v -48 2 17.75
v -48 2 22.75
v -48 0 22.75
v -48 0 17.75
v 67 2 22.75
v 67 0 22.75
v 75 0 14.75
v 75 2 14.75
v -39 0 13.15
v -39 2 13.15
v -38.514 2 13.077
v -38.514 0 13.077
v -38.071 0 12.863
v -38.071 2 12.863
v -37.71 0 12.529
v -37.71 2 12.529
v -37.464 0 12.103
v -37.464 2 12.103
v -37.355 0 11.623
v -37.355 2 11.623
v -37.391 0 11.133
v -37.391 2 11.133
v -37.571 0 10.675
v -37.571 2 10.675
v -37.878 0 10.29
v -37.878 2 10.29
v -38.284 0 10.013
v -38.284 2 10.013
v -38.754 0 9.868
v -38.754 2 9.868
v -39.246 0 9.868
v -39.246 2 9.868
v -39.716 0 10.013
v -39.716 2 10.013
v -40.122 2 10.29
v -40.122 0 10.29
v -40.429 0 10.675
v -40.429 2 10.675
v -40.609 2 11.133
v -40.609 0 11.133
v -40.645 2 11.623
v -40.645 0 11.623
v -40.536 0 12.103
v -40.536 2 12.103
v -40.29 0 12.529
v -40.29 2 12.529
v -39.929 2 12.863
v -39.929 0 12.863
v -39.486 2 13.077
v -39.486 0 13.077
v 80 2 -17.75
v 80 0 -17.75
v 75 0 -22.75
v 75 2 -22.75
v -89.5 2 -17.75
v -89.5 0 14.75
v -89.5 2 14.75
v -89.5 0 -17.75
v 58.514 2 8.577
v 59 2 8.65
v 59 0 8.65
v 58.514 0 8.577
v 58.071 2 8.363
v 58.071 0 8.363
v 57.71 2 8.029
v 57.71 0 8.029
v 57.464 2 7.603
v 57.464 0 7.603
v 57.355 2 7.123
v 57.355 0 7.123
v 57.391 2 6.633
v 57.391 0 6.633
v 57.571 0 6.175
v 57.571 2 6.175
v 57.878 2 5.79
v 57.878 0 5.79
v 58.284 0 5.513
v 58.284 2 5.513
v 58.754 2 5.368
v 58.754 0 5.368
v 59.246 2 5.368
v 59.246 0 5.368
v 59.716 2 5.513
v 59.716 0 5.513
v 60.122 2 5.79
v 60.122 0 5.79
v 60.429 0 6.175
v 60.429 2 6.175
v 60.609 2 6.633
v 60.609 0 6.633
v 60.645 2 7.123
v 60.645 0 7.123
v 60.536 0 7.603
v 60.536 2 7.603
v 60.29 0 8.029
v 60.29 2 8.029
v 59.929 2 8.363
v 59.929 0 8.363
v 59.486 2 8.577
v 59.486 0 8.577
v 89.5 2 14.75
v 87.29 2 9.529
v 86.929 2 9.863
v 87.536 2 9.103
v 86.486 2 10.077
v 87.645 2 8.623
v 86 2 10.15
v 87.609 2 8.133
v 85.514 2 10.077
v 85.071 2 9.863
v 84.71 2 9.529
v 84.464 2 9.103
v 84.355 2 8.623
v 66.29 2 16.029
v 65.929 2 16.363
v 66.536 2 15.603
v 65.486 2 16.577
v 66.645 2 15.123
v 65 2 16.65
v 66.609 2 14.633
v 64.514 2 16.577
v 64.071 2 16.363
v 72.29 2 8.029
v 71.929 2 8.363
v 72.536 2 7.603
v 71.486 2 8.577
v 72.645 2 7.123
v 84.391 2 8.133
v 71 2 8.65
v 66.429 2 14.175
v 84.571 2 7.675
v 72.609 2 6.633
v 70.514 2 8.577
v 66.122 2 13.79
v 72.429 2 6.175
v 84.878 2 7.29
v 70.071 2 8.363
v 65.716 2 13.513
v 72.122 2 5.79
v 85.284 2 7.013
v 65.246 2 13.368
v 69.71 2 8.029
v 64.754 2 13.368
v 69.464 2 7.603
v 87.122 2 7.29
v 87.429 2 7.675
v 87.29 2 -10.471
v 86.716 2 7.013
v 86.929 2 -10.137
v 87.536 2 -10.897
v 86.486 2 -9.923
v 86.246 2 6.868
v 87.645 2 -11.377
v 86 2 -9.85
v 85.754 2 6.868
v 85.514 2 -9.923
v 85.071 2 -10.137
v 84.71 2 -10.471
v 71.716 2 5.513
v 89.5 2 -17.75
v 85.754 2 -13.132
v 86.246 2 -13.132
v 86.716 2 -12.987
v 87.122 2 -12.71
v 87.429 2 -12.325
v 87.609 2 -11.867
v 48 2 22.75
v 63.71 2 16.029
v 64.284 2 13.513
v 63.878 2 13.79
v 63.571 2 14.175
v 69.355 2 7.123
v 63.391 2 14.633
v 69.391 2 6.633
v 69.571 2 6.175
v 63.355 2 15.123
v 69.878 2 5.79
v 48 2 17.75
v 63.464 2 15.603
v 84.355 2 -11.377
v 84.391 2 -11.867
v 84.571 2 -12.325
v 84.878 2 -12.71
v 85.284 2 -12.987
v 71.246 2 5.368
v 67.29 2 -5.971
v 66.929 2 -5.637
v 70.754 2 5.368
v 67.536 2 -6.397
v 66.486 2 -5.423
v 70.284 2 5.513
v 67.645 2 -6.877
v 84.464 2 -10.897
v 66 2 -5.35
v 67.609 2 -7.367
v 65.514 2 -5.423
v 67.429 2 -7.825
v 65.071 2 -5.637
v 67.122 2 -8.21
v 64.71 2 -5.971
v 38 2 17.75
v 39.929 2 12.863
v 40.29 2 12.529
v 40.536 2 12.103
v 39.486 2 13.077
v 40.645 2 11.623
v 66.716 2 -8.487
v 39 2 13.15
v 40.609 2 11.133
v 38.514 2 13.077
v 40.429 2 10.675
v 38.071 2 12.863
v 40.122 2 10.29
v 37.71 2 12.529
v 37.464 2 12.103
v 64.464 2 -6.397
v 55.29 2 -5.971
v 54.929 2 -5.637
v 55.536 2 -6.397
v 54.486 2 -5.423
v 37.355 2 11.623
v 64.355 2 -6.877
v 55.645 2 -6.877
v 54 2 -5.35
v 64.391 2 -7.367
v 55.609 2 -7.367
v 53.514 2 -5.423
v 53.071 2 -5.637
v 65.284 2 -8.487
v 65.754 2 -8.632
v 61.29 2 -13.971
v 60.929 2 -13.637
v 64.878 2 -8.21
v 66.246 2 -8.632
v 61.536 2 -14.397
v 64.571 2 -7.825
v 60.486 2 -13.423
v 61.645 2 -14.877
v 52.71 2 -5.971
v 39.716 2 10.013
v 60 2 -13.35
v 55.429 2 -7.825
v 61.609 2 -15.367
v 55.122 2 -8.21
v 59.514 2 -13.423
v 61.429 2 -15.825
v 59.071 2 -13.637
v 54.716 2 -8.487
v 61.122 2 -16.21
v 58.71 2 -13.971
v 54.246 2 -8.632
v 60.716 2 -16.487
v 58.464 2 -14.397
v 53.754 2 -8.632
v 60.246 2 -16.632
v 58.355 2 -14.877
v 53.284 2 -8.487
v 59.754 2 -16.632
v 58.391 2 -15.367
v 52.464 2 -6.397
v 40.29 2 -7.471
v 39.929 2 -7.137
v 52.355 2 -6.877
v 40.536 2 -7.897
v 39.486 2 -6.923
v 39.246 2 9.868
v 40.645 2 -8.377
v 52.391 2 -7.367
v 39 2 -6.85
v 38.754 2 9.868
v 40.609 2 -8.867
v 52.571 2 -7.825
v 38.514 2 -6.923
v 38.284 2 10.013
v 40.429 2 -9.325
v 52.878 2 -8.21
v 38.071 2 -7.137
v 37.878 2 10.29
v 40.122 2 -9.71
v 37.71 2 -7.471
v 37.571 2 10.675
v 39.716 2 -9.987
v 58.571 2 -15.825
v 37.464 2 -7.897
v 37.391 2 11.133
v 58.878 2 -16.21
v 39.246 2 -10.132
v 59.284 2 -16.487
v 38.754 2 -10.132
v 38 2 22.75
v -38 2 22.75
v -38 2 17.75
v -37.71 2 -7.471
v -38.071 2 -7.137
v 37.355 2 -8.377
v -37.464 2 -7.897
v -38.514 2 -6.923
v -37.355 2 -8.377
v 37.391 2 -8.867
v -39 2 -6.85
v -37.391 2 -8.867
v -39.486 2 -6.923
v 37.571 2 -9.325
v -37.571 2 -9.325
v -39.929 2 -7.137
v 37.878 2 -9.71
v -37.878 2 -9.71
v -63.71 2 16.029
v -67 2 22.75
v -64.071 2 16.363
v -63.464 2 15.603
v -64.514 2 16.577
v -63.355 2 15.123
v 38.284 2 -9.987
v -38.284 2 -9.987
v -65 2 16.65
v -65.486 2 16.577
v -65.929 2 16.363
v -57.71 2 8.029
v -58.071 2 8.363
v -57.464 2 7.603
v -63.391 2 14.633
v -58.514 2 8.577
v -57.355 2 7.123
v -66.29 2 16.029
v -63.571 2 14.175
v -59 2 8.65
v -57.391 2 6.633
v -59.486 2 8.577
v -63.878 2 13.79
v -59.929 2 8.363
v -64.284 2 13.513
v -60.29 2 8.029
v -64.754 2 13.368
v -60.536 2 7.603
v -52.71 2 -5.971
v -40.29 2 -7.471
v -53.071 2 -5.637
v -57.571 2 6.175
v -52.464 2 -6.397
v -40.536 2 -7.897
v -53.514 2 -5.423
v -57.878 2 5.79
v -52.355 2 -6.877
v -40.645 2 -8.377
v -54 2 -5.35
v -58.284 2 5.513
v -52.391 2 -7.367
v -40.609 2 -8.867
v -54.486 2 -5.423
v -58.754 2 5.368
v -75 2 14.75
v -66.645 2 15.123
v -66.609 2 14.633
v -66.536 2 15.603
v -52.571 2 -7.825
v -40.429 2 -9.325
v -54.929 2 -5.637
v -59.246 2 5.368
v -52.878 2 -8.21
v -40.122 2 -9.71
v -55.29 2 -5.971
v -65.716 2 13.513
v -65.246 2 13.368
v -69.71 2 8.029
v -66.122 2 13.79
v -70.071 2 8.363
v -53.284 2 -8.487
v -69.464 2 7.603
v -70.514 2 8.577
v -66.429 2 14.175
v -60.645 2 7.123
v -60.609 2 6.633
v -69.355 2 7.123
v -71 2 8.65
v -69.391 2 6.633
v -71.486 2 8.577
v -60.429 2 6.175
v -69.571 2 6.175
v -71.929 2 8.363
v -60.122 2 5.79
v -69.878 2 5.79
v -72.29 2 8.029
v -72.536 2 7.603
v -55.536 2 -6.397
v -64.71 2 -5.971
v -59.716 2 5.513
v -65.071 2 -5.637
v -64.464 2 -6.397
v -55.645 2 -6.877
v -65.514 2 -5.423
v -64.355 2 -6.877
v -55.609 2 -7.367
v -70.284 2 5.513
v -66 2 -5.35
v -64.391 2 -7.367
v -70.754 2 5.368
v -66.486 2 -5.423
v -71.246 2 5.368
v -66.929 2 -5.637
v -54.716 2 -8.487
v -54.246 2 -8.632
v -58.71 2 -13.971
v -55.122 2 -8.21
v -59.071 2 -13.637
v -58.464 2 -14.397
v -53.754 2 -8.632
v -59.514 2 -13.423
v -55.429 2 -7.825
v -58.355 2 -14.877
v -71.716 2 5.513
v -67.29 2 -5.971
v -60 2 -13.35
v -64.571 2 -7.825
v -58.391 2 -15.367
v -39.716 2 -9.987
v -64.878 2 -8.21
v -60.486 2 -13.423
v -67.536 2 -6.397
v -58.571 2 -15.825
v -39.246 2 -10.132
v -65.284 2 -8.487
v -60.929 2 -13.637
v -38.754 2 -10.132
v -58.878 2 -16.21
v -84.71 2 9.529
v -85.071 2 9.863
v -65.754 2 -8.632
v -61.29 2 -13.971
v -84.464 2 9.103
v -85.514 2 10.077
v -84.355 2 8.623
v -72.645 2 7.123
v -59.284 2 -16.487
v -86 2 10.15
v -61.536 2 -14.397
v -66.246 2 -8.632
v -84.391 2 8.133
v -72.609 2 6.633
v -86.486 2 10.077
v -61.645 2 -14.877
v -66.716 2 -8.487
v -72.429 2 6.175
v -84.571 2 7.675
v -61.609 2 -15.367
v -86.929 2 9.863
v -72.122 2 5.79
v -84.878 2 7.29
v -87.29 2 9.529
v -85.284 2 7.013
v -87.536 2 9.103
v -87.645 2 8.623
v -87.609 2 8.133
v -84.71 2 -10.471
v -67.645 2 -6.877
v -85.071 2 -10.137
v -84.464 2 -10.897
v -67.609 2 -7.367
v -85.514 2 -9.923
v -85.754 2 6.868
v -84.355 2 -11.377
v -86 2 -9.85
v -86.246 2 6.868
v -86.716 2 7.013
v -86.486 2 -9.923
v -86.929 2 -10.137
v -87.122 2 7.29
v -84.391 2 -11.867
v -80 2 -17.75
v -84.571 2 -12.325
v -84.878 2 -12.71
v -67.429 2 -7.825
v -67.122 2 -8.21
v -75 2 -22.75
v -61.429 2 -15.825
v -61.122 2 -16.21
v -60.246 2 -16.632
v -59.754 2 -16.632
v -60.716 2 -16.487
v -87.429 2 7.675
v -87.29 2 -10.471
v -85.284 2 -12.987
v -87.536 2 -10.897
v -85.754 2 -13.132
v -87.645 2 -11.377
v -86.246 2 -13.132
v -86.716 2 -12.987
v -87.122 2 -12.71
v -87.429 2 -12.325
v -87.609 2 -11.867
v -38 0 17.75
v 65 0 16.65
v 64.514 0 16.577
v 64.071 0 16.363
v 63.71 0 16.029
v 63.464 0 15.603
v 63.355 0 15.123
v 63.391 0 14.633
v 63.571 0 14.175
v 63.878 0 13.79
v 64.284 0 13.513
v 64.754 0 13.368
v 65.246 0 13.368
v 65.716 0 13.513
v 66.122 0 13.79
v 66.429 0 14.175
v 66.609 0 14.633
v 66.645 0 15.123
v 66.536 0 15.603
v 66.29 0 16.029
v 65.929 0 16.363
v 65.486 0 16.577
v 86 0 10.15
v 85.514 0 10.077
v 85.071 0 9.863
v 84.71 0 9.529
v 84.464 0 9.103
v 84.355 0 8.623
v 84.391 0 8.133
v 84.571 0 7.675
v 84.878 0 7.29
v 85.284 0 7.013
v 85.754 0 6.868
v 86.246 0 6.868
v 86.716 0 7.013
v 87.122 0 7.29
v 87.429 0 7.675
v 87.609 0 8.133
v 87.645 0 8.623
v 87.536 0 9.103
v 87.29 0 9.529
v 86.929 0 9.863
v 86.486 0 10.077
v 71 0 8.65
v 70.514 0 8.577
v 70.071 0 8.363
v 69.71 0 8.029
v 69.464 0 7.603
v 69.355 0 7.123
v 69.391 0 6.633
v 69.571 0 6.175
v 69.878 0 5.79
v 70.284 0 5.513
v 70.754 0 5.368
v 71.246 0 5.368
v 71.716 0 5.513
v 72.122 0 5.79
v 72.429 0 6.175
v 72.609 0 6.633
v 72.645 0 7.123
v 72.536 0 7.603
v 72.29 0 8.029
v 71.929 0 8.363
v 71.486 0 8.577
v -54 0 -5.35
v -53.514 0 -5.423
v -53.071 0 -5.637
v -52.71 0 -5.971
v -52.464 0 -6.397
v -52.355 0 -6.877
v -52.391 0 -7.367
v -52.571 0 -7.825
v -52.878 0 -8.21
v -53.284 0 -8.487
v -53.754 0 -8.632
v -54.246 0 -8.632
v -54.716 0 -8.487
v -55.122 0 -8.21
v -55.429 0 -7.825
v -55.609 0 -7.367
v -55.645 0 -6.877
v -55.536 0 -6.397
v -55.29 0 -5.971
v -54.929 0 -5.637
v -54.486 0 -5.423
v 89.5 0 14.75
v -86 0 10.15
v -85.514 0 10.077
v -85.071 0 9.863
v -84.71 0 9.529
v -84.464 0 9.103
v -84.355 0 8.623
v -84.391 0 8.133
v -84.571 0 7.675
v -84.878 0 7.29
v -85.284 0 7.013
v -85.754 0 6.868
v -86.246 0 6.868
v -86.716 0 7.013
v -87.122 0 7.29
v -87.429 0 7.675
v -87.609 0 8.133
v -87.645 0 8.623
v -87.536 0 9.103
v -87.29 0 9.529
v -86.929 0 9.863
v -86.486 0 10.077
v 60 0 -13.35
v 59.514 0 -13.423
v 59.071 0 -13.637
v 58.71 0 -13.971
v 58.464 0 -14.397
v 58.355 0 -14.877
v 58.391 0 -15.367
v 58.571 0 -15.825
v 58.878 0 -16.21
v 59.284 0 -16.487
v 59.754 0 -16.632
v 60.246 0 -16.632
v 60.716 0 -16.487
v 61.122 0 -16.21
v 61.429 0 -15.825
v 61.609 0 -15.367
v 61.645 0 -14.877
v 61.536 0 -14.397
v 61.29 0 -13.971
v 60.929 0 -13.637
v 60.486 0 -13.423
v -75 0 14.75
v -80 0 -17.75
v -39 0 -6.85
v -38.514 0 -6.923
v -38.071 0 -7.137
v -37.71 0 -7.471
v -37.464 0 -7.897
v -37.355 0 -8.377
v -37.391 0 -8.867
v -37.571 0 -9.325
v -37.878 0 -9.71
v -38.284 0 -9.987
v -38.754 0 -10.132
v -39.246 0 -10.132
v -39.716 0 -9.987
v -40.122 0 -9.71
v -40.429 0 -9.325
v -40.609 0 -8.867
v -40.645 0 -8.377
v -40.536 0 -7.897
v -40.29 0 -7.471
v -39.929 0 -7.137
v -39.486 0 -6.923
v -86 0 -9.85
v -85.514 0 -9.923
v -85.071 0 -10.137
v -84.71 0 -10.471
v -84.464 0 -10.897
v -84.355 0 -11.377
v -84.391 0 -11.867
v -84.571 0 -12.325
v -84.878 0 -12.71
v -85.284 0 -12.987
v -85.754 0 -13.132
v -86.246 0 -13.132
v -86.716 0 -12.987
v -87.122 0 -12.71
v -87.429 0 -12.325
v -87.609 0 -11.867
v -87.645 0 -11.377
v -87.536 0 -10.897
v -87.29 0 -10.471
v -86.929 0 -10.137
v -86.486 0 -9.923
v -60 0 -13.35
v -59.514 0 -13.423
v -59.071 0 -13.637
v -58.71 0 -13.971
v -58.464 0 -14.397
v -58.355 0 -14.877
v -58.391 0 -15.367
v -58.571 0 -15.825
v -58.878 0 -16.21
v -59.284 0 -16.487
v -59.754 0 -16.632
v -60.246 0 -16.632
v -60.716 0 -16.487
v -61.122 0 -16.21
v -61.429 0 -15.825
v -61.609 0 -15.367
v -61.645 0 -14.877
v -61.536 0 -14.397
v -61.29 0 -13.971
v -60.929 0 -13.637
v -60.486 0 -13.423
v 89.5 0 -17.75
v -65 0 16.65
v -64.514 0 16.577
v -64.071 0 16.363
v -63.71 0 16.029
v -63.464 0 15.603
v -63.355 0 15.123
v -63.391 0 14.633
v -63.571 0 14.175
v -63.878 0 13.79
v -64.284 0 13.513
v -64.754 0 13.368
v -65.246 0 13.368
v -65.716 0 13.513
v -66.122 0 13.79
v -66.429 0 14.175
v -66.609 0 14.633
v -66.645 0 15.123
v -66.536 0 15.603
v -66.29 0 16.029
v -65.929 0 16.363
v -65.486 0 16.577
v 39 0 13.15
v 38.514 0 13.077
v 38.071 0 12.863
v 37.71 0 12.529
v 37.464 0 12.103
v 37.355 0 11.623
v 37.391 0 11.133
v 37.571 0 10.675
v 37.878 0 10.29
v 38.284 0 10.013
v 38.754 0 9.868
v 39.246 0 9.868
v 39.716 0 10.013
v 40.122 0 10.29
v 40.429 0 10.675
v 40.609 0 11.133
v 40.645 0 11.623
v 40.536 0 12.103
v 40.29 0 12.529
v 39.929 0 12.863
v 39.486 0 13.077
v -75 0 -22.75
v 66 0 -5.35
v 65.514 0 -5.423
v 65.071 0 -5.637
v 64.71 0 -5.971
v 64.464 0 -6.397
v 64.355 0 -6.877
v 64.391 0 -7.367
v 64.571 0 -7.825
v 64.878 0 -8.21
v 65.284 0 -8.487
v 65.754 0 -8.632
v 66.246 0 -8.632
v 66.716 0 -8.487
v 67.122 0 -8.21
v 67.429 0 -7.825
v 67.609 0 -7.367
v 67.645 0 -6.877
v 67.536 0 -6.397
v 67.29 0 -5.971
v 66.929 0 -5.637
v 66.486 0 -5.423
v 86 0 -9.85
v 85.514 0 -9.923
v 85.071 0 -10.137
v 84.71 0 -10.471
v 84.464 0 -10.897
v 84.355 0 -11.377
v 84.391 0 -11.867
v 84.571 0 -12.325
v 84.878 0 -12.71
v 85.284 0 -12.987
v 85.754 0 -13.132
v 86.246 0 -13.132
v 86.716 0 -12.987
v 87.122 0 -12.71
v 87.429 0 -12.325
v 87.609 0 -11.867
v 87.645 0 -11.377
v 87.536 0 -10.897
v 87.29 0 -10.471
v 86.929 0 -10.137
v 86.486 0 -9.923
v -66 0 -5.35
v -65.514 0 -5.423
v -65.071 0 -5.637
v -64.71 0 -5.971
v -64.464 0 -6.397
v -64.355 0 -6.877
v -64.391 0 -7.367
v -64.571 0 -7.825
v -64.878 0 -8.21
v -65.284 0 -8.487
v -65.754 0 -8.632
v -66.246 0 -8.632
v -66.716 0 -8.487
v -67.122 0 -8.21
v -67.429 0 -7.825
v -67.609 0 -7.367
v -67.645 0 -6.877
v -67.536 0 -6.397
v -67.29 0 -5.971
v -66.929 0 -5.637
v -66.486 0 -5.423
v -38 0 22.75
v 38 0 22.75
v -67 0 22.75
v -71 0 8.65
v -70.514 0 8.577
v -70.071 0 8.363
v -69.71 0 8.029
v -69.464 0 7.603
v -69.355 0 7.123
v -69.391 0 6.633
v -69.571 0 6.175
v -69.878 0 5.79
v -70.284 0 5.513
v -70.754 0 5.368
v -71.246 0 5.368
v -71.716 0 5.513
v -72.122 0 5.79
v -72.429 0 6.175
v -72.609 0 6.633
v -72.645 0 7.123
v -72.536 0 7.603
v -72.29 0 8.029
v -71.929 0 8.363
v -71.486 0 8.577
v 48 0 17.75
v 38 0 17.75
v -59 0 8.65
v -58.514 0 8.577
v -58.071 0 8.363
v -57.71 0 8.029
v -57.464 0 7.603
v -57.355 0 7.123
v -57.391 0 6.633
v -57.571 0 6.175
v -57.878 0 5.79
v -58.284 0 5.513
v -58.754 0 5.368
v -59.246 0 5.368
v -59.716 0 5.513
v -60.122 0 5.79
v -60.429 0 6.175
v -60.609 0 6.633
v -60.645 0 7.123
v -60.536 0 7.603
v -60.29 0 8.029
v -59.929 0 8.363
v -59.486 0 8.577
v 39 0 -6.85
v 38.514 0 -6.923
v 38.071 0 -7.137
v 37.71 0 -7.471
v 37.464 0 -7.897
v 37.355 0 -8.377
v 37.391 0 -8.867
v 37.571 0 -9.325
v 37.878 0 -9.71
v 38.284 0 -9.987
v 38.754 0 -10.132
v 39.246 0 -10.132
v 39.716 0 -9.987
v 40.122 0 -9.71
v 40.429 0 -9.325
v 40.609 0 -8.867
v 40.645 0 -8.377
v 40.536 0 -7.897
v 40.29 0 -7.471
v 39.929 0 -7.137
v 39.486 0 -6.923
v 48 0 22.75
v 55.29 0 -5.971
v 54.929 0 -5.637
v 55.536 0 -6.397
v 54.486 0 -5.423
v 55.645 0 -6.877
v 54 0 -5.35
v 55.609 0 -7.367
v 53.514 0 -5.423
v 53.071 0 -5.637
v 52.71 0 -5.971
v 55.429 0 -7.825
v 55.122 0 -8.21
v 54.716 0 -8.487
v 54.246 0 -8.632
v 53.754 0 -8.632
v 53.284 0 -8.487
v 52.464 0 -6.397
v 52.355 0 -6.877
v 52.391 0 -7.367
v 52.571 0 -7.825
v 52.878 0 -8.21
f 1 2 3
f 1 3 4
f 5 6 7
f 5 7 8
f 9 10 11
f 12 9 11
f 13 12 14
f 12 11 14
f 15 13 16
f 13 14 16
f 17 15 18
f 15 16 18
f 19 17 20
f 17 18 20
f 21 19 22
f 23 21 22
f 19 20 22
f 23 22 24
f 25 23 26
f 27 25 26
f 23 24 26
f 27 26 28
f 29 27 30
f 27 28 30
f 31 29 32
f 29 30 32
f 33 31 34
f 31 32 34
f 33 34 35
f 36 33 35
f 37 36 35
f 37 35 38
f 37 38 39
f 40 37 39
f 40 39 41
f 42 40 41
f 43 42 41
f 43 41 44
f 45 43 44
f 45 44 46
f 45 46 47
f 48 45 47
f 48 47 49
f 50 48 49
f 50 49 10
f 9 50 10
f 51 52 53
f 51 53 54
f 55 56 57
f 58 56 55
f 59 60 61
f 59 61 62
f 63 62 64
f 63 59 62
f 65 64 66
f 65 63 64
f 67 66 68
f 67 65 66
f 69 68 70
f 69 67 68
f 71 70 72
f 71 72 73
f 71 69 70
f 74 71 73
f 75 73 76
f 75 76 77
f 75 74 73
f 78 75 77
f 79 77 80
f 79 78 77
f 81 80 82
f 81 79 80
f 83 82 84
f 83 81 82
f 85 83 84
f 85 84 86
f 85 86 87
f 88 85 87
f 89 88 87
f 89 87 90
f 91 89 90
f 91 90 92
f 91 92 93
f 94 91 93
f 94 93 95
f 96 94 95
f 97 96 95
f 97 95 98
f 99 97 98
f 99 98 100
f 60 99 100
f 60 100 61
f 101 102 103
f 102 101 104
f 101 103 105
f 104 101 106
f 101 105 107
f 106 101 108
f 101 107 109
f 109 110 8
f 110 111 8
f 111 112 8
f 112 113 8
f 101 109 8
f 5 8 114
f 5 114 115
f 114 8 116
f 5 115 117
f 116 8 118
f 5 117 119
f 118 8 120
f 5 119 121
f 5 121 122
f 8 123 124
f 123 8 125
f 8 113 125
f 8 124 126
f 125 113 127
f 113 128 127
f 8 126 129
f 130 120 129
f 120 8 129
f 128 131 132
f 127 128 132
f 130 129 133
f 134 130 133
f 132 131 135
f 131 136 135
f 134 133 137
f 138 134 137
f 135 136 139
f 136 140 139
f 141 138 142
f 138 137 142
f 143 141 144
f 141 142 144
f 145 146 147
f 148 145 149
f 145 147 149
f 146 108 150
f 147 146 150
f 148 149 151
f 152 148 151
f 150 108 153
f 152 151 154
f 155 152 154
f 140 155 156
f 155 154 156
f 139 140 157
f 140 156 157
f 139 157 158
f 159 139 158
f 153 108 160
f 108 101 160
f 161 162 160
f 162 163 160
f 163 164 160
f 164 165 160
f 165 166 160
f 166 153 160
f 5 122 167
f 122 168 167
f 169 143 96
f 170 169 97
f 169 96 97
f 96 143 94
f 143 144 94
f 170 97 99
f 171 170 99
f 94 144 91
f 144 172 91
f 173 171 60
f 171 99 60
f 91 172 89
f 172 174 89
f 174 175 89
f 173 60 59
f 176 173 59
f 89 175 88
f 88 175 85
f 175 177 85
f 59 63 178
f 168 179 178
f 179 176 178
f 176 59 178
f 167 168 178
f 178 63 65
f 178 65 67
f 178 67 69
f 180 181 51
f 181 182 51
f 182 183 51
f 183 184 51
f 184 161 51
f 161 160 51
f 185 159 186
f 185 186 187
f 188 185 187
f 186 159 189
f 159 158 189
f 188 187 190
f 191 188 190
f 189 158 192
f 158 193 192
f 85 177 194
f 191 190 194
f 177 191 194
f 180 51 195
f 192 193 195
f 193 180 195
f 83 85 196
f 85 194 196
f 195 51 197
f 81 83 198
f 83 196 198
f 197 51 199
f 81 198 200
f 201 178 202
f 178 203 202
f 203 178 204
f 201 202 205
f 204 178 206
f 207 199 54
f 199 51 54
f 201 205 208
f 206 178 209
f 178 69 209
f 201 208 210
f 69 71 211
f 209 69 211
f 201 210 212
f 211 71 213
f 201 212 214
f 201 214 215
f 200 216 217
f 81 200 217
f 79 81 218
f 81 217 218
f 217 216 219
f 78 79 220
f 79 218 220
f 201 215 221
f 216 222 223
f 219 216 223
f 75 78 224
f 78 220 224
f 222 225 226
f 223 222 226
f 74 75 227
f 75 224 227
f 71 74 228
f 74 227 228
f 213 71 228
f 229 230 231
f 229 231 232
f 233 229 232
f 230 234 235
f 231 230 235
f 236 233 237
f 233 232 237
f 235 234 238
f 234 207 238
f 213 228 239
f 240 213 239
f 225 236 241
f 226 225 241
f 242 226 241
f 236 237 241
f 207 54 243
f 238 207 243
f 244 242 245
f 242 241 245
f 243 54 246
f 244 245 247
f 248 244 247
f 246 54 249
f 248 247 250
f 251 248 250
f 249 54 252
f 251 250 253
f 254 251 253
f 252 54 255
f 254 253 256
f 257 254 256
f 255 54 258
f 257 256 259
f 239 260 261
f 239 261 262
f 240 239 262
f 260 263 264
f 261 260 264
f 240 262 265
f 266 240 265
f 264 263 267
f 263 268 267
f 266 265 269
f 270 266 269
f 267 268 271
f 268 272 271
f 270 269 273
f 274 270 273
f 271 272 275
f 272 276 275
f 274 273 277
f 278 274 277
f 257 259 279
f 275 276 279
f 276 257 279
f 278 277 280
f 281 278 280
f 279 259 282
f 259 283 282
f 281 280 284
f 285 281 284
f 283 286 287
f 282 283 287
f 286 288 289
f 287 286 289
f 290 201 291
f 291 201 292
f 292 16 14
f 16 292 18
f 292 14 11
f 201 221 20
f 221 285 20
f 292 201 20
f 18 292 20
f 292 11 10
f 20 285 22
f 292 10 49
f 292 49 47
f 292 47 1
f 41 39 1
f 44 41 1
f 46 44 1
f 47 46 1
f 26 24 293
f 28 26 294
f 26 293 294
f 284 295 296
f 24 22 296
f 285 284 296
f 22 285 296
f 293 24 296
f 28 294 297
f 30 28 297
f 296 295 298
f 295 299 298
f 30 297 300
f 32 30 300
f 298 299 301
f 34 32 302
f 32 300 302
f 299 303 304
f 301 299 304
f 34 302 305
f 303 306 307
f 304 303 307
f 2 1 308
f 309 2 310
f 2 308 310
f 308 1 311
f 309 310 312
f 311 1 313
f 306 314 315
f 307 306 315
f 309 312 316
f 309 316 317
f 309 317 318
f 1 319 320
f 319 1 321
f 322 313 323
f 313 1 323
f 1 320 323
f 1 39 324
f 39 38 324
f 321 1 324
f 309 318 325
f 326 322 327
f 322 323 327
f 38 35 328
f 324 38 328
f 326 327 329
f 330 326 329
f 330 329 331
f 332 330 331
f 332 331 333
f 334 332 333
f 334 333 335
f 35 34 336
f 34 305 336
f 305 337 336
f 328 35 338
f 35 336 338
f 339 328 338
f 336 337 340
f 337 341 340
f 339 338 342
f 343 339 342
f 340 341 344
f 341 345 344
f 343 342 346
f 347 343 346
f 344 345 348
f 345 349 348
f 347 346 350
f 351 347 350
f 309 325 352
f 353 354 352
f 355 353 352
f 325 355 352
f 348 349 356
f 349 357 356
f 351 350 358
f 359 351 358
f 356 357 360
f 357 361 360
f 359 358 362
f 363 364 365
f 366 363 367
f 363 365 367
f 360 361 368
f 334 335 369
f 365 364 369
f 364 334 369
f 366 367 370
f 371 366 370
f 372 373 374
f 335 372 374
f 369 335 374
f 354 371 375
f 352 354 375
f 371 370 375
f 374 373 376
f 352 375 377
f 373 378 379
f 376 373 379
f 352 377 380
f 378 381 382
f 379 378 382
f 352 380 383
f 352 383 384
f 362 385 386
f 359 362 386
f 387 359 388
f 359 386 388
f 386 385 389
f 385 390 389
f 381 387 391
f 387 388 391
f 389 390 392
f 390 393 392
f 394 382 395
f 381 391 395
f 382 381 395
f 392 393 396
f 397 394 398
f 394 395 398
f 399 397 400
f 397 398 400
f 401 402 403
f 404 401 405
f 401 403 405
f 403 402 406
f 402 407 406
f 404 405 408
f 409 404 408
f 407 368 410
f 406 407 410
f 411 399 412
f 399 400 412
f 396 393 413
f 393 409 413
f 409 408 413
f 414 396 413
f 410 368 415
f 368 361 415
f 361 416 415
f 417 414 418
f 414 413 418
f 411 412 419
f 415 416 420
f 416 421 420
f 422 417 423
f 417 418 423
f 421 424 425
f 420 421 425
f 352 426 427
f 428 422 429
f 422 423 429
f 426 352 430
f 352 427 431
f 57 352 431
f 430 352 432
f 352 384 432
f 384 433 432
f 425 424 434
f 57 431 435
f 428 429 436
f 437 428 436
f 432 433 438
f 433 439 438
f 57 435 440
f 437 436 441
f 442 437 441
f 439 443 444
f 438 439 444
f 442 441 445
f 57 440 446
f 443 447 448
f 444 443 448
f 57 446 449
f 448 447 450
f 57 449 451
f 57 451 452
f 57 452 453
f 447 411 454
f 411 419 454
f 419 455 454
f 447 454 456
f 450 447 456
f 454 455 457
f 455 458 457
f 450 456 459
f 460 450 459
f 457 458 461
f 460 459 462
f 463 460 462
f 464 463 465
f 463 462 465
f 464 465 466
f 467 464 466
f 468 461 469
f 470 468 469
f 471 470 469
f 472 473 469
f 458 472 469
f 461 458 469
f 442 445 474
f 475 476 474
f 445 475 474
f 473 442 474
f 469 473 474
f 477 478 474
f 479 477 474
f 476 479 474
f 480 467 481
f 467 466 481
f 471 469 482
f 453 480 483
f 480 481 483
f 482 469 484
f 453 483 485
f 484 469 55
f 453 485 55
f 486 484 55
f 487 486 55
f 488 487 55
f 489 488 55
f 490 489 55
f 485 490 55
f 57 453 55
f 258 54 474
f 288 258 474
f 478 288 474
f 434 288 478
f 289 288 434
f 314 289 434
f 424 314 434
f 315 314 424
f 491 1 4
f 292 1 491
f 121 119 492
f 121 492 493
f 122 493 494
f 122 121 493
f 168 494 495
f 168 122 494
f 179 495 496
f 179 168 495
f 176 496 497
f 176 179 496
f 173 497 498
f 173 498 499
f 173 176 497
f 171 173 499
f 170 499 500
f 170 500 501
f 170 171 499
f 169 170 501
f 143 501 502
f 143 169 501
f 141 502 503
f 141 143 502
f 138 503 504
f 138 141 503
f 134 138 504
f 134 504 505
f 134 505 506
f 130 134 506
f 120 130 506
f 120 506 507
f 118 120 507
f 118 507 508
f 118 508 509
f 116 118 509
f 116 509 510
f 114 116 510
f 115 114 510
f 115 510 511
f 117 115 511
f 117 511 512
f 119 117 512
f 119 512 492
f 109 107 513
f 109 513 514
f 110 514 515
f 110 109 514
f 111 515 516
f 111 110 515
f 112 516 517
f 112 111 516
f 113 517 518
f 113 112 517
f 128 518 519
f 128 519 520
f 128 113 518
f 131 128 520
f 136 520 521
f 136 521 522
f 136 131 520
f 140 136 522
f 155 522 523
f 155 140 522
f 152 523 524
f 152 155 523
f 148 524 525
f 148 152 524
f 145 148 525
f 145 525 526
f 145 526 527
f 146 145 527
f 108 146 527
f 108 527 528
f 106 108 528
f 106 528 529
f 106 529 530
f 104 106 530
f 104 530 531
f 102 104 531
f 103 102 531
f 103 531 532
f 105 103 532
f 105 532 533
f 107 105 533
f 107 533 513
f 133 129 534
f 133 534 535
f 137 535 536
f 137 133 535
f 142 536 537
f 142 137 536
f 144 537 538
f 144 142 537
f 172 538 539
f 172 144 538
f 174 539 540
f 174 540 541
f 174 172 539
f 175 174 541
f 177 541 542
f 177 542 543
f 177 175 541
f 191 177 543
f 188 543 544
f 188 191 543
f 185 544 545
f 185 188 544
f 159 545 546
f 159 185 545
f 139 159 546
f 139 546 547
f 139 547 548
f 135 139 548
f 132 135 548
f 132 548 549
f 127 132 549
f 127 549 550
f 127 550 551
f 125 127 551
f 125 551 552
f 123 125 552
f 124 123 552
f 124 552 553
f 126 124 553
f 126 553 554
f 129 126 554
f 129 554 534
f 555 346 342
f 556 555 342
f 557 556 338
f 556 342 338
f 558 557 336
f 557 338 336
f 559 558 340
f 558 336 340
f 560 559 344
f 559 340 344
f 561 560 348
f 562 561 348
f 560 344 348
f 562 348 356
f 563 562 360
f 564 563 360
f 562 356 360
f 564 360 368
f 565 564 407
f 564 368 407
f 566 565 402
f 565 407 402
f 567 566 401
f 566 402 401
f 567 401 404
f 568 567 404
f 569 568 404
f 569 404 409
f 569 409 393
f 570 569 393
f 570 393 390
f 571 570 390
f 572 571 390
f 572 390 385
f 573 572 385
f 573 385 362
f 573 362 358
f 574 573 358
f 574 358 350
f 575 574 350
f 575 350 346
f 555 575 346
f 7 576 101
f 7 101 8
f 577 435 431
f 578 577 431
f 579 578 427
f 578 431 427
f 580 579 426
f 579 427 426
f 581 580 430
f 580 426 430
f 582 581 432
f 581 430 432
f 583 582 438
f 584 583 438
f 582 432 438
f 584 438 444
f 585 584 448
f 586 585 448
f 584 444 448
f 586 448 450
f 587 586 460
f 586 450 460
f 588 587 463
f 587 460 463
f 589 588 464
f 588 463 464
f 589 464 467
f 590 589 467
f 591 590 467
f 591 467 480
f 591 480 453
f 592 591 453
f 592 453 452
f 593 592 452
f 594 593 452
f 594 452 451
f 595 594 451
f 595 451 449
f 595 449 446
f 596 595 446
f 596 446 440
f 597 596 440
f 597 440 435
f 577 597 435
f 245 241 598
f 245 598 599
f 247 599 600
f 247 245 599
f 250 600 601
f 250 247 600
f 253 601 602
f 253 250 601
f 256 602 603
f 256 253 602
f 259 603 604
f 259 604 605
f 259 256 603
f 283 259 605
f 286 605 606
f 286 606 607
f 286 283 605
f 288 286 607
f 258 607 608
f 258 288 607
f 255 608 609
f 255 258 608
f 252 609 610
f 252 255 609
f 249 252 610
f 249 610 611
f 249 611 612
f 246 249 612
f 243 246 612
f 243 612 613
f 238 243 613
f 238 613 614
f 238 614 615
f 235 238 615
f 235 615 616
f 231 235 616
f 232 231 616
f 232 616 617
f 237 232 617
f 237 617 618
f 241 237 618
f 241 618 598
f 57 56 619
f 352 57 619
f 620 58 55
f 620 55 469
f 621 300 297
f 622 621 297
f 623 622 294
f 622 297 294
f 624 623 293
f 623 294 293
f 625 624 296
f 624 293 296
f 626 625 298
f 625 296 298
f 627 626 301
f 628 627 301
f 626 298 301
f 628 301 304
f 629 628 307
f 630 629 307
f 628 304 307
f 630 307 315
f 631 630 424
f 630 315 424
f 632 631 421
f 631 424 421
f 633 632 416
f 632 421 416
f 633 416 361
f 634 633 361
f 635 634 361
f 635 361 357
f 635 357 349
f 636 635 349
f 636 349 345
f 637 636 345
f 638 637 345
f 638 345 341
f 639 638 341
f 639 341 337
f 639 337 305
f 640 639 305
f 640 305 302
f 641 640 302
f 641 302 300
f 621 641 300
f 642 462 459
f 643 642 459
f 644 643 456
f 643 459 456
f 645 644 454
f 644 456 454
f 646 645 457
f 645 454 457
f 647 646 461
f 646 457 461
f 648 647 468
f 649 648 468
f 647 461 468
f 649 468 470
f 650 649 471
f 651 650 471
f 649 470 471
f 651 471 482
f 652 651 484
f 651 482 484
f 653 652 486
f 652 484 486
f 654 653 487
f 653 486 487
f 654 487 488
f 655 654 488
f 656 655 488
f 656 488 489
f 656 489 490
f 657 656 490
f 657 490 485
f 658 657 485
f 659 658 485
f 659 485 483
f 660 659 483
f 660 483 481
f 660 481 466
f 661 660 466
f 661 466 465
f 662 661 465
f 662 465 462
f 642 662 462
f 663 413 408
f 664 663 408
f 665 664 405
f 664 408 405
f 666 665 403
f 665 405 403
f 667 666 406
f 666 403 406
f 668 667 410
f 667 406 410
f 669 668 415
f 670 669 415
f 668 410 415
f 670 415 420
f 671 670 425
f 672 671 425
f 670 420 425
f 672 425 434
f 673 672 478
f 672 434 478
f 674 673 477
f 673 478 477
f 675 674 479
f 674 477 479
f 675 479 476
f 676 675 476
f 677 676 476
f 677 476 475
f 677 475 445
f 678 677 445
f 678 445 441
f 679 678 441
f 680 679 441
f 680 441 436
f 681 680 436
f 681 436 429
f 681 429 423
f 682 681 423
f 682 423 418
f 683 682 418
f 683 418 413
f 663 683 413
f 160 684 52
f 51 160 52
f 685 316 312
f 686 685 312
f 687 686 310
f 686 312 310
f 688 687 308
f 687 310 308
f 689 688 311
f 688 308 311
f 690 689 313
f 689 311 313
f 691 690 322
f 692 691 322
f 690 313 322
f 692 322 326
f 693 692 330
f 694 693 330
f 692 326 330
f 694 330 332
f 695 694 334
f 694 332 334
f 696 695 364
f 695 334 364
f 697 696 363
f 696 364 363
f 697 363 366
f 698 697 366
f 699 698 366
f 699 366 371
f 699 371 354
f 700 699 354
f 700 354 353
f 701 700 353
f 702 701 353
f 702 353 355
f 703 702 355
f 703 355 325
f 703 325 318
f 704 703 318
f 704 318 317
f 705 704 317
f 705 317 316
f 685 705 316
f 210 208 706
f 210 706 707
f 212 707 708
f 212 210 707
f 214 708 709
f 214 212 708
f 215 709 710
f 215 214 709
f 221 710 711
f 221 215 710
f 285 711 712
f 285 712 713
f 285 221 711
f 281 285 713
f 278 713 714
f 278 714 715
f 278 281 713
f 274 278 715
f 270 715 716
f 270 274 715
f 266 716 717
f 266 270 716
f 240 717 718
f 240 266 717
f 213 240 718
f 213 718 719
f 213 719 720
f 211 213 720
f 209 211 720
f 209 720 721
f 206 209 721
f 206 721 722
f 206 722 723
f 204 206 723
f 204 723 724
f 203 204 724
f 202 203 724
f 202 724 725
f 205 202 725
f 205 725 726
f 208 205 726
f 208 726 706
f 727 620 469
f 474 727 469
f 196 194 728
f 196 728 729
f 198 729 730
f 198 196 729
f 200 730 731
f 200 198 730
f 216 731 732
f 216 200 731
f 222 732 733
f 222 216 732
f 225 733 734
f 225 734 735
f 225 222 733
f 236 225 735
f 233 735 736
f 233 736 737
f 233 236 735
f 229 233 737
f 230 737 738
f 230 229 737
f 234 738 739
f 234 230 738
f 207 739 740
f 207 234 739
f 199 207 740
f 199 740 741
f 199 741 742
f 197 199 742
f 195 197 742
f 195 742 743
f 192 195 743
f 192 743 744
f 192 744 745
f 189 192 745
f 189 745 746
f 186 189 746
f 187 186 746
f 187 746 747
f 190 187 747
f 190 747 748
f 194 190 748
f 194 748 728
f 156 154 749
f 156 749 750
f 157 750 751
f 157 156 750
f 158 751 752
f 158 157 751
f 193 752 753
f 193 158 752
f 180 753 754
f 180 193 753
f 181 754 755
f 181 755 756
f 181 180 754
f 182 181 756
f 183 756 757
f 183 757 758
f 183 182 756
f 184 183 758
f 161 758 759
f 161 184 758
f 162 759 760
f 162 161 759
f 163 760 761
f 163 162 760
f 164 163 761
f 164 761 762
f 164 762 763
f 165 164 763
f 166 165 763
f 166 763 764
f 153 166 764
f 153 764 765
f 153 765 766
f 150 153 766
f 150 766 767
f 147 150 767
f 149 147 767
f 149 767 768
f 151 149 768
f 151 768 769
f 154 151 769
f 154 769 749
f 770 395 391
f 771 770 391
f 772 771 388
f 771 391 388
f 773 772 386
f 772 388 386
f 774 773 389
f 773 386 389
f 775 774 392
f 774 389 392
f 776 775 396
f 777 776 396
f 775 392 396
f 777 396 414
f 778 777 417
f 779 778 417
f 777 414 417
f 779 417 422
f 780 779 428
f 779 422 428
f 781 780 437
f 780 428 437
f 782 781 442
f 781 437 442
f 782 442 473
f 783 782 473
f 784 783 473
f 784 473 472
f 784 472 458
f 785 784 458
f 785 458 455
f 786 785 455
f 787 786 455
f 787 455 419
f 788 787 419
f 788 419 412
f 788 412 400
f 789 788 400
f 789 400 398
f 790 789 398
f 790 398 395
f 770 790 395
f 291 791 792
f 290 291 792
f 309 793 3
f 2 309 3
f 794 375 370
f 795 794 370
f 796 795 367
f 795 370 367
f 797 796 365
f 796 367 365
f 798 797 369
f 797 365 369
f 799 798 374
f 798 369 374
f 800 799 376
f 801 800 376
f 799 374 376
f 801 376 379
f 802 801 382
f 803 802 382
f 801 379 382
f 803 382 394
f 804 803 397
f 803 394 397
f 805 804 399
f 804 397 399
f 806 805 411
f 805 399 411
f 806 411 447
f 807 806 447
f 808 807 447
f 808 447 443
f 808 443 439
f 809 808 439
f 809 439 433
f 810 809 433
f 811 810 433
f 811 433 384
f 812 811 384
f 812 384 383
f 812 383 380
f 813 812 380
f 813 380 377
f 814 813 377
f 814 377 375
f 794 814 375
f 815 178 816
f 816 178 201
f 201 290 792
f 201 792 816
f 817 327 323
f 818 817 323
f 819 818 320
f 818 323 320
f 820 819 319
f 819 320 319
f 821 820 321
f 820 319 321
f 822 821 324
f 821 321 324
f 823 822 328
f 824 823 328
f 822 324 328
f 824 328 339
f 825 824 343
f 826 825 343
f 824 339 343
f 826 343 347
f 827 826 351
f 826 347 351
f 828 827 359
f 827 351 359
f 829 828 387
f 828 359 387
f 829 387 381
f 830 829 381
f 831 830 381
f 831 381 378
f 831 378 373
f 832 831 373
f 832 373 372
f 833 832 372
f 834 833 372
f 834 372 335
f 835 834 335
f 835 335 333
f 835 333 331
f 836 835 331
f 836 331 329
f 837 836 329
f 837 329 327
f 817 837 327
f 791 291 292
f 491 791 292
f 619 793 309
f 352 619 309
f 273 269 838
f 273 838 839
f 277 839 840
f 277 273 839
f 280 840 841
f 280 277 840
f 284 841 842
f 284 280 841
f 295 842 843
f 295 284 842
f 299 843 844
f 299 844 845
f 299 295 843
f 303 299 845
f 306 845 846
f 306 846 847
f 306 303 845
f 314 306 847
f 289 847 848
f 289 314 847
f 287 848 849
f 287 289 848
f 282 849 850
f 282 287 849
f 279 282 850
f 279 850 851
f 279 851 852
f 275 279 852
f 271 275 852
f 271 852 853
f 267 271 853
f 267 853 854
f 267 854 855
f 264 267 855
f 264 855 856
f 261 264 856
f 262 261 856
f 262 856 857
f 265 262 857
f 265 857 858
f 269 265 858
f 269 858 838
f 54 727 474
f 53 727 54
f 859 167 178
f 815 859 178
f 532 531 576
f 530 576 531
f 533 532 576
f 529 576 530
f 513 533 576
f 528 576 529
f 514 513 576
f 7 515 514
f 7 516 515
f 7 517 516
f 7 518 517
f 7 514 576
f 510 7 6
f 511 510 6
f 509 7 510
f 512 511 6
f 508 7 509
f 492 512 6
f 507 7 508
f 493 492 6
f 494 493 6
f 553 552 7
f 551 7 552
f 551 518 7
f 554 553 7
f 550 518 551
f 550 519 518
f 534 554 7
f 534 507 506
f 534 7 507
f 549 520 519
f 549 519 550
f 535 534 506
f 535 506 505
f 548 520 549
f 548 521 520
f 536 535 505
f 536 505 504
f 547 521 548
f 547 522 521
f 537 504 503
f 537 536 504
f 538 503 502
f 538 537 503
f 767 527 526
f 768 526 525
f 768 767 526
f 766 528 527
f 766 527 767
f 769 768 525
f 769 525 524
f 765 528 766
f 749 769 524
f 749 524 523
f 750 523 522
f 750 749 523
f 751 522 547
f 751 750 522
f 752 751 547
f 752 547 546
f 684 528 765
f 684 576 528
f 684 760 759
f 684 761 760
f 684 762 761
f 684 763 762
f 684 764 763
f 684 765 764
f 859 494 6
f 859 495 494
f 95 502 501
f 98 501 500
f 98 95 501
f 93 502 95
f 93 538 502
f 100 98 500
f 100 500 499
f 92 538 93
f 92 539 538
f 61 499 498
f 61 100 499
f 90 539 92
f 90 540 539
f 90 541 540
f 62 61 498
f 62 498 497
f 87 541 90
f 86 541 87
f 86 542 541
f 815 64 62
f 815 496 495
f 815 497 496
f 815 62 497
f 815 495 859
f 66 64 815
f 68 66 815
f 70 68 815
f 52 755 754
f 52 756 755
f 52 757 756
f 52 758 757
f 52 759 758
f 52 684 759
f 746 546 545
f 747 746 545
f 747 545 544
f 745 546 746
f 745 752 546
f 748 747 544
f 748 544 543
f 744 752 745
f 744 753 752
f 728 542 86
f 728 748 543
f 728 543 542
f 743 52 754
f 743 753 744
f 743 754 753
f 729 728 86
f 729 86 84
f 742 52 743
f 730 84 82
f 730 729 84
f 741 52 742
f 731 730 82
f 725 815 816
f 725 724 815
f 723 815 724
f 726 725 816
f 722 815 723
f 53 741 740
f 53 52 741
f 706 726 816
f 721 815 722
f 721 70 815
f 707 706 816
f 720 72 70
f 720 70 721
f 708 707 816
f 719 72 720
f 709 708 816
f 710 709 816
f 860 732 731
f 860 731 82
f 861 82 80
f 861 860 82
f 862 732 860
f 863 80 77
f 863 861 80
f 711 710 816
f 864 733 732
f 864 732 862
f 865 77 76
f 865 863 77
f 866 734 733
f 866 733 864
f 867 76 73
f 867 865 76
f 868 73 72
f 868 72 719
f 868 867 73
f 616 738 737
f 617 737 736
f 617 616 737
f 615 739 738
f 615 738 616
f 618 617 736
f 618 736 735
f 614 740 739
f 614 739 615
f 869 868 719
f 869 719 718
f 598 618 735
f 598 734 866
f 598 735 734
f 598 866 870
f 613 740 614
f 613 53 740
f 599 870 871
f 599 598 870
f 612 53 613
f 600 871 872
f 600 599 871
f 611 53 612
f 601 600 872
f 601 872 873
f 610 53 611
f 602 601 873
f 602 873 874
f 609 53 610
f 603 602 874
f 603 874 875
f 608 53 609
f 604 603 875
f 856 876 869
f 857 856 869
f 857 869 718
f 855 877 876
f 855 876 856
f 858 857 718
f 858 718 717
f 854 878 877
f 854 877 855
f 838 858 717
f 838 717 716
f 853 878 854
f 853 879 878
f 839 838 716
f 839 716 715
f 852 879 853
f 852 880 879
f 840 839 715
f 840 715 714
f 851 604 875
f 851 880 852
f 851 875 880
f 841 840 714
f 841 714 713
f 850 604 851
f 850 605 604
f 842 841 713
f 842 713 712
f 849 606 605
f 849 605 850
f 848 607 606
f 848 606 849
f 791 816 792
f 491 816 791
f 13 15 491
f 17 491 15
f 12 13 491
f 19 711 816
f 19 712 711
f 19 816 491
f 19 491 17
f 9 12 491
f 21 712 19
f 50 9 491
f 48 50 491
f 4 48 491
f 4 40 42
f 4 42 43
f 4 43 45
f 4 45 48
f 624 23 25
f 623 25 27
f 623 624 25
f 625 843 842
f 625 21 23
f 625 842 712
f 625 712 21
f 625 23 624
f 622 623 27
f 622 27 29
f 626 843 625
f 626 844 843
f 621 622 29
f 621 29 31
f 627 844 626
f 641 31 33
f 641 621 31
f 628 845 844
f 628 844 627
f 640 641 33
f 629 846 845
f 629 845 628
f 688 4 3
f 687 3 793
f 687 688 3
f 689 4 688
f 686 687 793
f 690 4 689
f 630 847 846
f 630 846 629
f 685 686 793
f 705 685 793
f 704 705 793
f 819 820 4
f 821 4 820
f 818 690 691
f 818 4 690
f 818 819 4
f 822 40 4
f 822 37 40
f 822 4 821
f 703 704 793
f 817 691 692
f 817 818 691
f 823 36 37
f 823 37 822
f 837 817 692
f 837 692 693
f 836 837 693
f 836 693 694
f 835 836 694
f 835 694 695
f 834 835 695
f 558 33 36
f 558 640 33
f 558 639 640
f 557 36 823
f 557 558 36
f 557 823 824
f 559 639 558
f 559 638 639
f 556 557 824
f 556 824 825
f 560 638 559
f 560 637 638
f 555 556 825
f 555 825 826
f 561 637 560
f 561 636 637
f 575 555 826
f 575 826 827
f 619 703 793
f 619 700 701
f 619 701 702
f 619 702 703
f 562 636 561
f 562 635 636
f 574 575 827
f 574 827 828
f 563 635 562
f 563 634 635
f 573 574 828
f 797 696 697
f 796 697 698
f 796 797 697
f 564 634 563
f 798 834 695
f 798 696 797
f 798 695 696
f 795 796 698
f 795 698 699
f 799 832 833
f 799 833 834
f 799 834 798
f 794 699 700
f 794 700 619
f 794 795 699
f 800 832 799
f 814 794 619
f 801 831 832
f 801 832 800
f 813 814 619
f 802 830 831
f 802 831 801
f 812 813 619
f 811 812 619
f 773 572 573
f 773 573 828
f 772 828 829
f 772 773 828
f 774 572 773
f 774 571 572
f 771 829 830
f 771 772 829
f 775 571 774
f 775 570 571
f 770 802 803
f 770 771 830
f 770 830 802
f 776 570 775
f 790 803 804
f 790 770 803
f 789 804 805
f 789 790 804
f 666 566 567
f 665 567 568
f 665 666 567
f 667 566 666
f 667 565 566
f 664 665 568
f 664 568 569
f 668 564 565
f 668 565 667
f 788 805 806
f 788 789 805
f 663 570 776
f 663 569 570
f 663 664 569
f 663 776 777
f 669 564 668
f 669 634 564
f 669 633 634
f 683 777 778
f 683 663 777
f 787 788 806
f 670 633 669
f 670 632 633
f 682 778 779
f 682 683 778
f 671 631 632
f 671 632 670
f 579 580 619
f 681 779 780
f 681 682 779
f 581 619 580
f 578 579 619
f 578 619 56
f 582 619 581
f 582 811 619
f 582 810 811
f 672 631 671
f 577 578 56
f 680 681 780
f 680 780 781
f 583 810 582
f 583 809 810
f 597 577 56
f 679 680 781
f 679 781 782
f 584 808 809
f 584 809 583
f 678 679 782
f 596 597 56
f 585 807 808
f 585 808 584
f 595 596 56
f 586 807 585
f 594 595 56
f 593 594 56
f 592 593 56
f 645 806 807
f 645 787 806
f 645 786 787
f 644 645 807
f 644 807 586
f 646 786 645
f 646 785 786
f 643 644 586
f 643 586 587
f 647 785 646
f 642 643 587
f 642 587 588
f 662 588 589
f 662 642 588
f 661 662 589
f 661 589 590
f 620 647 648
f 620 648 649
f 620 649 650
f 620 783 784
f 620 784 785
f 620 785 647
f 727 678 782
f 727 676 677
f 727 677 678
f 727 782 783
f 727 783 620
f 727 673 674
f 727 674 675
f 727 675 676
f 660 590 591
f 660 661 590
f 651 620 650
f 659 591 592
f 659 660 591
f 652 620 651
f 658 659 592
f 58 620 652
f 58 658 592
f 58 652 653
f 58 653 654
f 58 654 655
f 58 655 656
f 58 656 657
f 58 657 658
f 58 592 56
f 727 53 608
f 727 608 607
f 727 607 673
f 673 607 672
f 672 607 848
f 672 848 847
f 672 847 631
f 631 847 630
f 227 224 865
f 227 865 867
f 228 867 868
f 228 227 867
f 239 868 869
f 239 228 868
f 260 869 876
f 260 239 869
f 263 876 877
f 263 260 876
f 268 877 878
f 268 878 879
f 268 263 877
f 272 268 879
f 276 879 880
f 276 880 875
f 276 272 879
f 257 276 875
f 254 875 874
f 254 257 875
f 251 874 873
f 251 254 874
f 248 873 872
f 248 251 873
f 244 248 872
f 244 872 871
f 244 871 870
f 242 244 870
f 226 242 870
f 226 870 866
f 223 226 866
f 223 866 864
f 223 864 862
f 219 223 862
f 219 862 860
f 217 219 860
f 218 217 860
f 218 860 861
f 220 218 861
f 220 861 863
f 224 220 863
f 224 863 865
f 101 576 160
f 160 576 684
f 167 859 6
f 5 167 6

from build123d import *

# Parameters (mm, degrees)
SKETCH_1_W          = 150
SKETCH_1_H          = 45.5
EXTRUDE_1_DEPTH     = 2
CUT_EXTRUDE_1_REACH = 80.4
SKETCH_2_R          = 1.65
CUT_EXTRUDE_2_REACH = 80.4
SKETCH_4_W          = 10
SKETCH_4_H          = 5
CHAMFER_1_SIZE      = 8
SKETCH_6_W          = 14.5
SKETCH_6_H          = 32.5
EXTRUDE_2_DEPTH     = 2
CUT_EXTRUDE_3_REACH = 94.368
SKETCH_7_R          = 1.65
CHAMFER_2_SIZE      = 5


with BuildPart() as part:
    # 草图1 → 凸台-拉伸1 (new body)
    with BuildSketch(Plane(origin=(0, 0, 0), x_dir=(1, 0, 0), z_dir=(0, 1, 0))):
        Rectangle(SKETCH_1_W, SKETCH_1_H)
    extrude(amount=EXTRUDE_1_DEPTH)

    # 草图2 → 切除-拉伸1 (cut, up to next)
    with BuildSketch(Plane(origin=(0, 2, 0), x_dir=(1, 0, 0), z_dir=(0, 1, 0)), mode=Mode.PRIVATE) as cut_extrude_1_sk1:
        with Locations(Location((-60, 15, 0), (0, 0, 270))):
            Circle(SKETCH_2_R)
    cut_extrude_1_tool1 = extrude(cut_extrude_1_sk1.sketch, amount=-CUT_EXTRUDE_1_REACH, mode=Mode.PRIVATE) & part.part
    # 草图2 → 切除-拉伸1 (cut, up to next)
    with BuildSketch(Plane(origin=(0, 2, 0), x_dir=(1, 0, 0), z_dir=(0, 1, 0)), mode=Mode.PRIVATE) as cut_extrude_1_sk2:
        with Locations(Location((-66, 7, 0), (0, 0, 270))):
            Circle(SKETCH_2_R)
    cut_extrude_1_tool2 = extrude(cut_extrude_1_sk2.sketch, amount=-CUT_EXTRUDE_1_REACH, mode=Mode.PRIVATE) & part.part
    # 草图2 → 切除-拉伸1 (cut, up to next)
    with BuildSketch(Plane(origin=(0, 2, 0), x_dir=(1, 0, 0), z_dir=(0, 1, 0)), mode=Mode.PRIVATE) as cut_extrude_1_sk3:
        with Locations(Location((-54, 7, 0), (0, 0, 270))):
            Circle(SKETCH_2_R)
    cut_extrude_1_tool3 = extrude(cut_extrude_1_sk3.sketch, amount=-CUT_EXTRUDE_1_REACH, mode=Mode.PRIVATE) & part.part
    # 草图2 → 切除-拉伸1 (cut, up to next)
    with BuildSketch(Plane(origin=(0, 2, 0), x_dir=(1, 0, 0), z_dir=(0, 1, 0)), mode=Mode.PRIVATE) as cut_extrude_1_sk4:
        with Locations(Location((-71, -7, 0), (0, 0, 270))):
            Circle(SKETCH_2_R)
    cut_extrude_1_tool4 = extrude(cut_extrude_1_sk4.sketch, amount=-CUT_EXTRUDE_1_REACH, mode=Mode.PRIVATE) & part.part
    # 草图2 → 切除-拉伸1 (cut, up to next)
    with BuildSketch(Plane(origin=(0, 2, 0), x_dir=(1, 0, 0), z_dir=(0, 1, 0)), mode=Mode.PRIVATE) as cut_extrude_1_sk5:
        with Locations(Location((-59, -7, 0), (0, 0, 270))):
            Circle(SKETCH_2_R)
    cut_extrude_1_tool5 = extrude(cut_extrude_1_sk5.sketch, amount=-CUT_EXTRUDE_1_REACH, mode=Mode.PRIVATE) & part.part
    # 草图2 → 切除-拉伸1 (cut, up to next)
    with BuildSketch(Plane(origin=(0, 2, 0), x_dir=(1, 0, 0), z_dir=(0, 1, 0)), mode=Mode.PRIVATE) as cut_extrude_1_sk6:
        with Locations(Location((-65, -15, 0), (0, 0, 270))):
            Circle(SKETCH_2_R)
    cut_extrude_1_tool6 = extrude(cut_extrude_1_sk6.sketch, amount=-CUT_EXTRUDE_1_REACH, mode=Mode.PRIVATE) & part.part
    cut_extrude_1_1 = cut_extrude_1_tool1.solids().sort_by_distance((-60, 2, -15))[0]
    add(cut_extrude_1_1, mode=Mode.SUBTRACT)
    cut_extrude_1_2 = cut_extrude_1_tool2.solids().sort_by_distance((-66, 2, -7))[0]
    add(cut_extrude_1_2, mode=Mode.SUBTRACT)
    cut_extrude_1_3 = cut_extrude_1_tool3.solids().sort_by_distance((-54, 2, -7))[0]
    add(cut_extrude_1_3, mode=Mode.SUBTRACT)
    cut_extrude_1_4 = cut_extrude_1_tool4.solids().sort_by_distance((-71, 2, 7))[0]
    add(cut_extrude_1_4, mode=Mode.SUBTRACT)
    cut_extrude_1_5 = cut_extrude_1_tool5.solids().sort_by_distance((-59, 2, 7))[0]
    add(cut_extrude_1_5, mode=Mode.SUBTRACT)
    cut_extrude_1_6 = cut_extrude_1_tool6.solids().sort_by_distance((-65, 2, 15))[0]
    add(cut_extrude_1_6, mode=Mode.SUBTRACT)
    cut_extrude_1 = cut_extrude_1_1 + cut_extrude_1_2 + cut_extrude_1_3 + cut_extrude_1_4 + cut_extrude_1_5 + cut_extrude_1_6  # 切除-拉伸1 as one shape, for the pattern or mirror that repeats it

    # 草图4 → 切除-拉伸2 (cut, up to next)
    with BuildSketch(Plane(origin=(0, 2, 0), x_dir=(1, 0, 0), z_dir=(0, 1, 0)), mode=Mode.PRIVATE) as cut_extrude_2_sk1:
        with Locations((-43, -20.25)):
            Rectangle(SKETCH_4_W, SKETCH_4_H)
    cut_extrude_2_tool1 = extrude(cut_extrude_2_sk1.sketch, amount=-CUT_EXTRUDE_2_REACH, mode=Mode.PRIVATE) & part.part
    cut_extrude_2 = cut_extrude_2_tool1.solids().sort_by_distance((-43, 2, 20.25))[0]
    add(cut_extrude_2, mode=Mode.SUBTRACT)

    # 镜向1: 切除-拉伸1, 切除-拉伸2 across plane
    add(cut_extrude_1.mirror(Plane(origin=(0, 0, 0), x_dir=(0, 0, 1), z_dir=(1, 0, 0))), mode=Mode.SUBTRACT)
    add(cut_extrude_2.mirror(Plane(origin=(0, 0, 0), x_dir=(0, 0, 1), z_dir=(1, 0, 0))), mode=Mode.SUBTRACT)

    # 倒角1
    chamfer_1_edges = [part.edges().sort_by_distance(p)[0] for p in [
        (75, 1, 22.75),
        (-75, 1, 22.75),
    ]]
    chamfer(chamfer_1_edges, length=CHAMFER_1_SIZE)

    # 草图6 → 凸台-拉伸2 (add)
    with BuildSketch(Plane(origin=(0, 0, 0), x_dir=(1, 0, 0), z_dir=(0, 1, 0))):
        with Locations((-82.25, 1.5)):
            Rectangle(SKETCH_6_W, SKETCH_6_H)
    extrude_2 = extrude(amount=EXTRUDE_2_DEPTH)

    # 草图7 → 切除-拉伸3 (cut, up to next)
    with BuildSketch(Plane(origin=(0, 2, 0), x_dir=(1, 0, 0), z_dir=(0, 1, 0)), mode=Mode.PRIVATE) as cut_extrude_3_sk1:
        with Locations(Location((-86, -8.5, 0), (0, 0, 270))):
            Circle(SKETCH_7_R)
    cut_extrude_3_tool1 = extrude(cut_extrude_3_sk1.sketch, amount=-CUT_EXTRUDE_3_REACH, mode=Mode.PRIVATE) & part.part
    # 草图7 → 切除-拉伸3 (cut, up to next)
    with BuildSketch(Plane(origin=(0, 2, 0), x_dir=(1, 0, 0), z_dir=(0, 1, 0)), mode=Mode.PRIVATE) as cut_extrude_3_sk2:
        with Locations(Location((-86, 11.5, 0), (0, 0, 270))):
            Circle(SKETCH_7_R)
    cut_extrude_3_tool2 = extrude(cut_extrude_3_sk2.sketch, amount=-CUT_EXTRUDE_3_REACH, mode=Mode.PRIVATE) & part.part
    # 草图7 → 切除-拉伸3 (cut, up to next)
    with BuildSketch(Plane(origin=(0, 2, 0), x_dir=(1, 0, 0), z_dir=(0, 1, 0)), mode=Mode.PRIVATE) as cut_extrude_3_sk3:
        with Locations(Location((-39, -11.5, 0), (0, 0, 270))):
            Circle(SKETCH_7_R)
    cut_extrude_3_tool3 = extrude(cut_extrude_3_sk3.sketch, amount=-CUT_EXTRUDE_3_REACH, mode=Mode.PRIVATE) & part.part
    # 草图7 → 切除-拉伸3 (cut, up to next)
    with BuildSketch(Plane(origin=(0, 2, 0), x_dir=(1, 0, 0), z_dir=(0, 1, 0)), mode=Mode.PRIVATE) as cut_extrude_3_sk4:
        with Locations(Location((-39, 8.5, 0), (0, 0, 270))):
            Circle(SKETCH_7_R)
    cut_extrude_3_tool4 = extrude(cut_extrude_3_sk4.sketch, amount=-CUT_EXTRUDE_3_REACH, mode=Mode.PRIVATE) & part.part
    cut_extrude_3_1 = cut_extrude_3_tool1.solids().sort_by_distance((-86, 2, 8.5))[0]
    add(cut_extrude_3_1, mode=Mode.SUBTRACT)
    cut_extrude_3_2 = cut_extrude_3_tool2.solids().sort_by_distance((-86, 2, -11.5))[0]
    add(cut_extrude_3_2, mode=Mode.SUBTRACT)
    cut_extrude_3_3 = cut_extrude_3_tool3.solids().sort_by_distance((-39, 2, 11.5))[0]
    add(cut_extrude_3_3, mode=Mode.SUBTRACT)
    cut_extrude_3_4 = cut_extrude_3_tool4.solids().sort_by_distance((-39, 2, -8.5))[0]
    add(cut_extrude_3_4, mode=Mode.SUBTRACT)
    cut_extrude_3 = cut_extrude_3_1 + cut_extrude_3_2 + cut_extrude_3_3 + cut_extrude_3_4  # 切除-拉伸3 as one shape, for the pattern or mirror that repeats it

    # 镜向3: 凸台-拉伸2, 切除-拉伸3 across plane
    add(extrude_2.mirror(Plane(origin=(0, 0, 0), x_dir=(0, 0, 1), z_dir=(1, 0, 0))))
    add(cut_extrude_3.mirror(Plane(origin=(0, 0, 0), x_dir=(0, 0, 1), z_dir=(1, 0, 0))), mode=Mode.SUBTRACT)

    # 倒角2
    chamfer_2_edges = [part.edges().sort_by_distance(p)[0] for p in [
        (-75, 1, -17.75),
        (75, 1, -17.75),
    ]]
    chamfer(chamfer_2_edges, length=CHAMFER_2_SIZE - 0.0001)  # a hair under: the kernel refuses the full size


solid = part.part
